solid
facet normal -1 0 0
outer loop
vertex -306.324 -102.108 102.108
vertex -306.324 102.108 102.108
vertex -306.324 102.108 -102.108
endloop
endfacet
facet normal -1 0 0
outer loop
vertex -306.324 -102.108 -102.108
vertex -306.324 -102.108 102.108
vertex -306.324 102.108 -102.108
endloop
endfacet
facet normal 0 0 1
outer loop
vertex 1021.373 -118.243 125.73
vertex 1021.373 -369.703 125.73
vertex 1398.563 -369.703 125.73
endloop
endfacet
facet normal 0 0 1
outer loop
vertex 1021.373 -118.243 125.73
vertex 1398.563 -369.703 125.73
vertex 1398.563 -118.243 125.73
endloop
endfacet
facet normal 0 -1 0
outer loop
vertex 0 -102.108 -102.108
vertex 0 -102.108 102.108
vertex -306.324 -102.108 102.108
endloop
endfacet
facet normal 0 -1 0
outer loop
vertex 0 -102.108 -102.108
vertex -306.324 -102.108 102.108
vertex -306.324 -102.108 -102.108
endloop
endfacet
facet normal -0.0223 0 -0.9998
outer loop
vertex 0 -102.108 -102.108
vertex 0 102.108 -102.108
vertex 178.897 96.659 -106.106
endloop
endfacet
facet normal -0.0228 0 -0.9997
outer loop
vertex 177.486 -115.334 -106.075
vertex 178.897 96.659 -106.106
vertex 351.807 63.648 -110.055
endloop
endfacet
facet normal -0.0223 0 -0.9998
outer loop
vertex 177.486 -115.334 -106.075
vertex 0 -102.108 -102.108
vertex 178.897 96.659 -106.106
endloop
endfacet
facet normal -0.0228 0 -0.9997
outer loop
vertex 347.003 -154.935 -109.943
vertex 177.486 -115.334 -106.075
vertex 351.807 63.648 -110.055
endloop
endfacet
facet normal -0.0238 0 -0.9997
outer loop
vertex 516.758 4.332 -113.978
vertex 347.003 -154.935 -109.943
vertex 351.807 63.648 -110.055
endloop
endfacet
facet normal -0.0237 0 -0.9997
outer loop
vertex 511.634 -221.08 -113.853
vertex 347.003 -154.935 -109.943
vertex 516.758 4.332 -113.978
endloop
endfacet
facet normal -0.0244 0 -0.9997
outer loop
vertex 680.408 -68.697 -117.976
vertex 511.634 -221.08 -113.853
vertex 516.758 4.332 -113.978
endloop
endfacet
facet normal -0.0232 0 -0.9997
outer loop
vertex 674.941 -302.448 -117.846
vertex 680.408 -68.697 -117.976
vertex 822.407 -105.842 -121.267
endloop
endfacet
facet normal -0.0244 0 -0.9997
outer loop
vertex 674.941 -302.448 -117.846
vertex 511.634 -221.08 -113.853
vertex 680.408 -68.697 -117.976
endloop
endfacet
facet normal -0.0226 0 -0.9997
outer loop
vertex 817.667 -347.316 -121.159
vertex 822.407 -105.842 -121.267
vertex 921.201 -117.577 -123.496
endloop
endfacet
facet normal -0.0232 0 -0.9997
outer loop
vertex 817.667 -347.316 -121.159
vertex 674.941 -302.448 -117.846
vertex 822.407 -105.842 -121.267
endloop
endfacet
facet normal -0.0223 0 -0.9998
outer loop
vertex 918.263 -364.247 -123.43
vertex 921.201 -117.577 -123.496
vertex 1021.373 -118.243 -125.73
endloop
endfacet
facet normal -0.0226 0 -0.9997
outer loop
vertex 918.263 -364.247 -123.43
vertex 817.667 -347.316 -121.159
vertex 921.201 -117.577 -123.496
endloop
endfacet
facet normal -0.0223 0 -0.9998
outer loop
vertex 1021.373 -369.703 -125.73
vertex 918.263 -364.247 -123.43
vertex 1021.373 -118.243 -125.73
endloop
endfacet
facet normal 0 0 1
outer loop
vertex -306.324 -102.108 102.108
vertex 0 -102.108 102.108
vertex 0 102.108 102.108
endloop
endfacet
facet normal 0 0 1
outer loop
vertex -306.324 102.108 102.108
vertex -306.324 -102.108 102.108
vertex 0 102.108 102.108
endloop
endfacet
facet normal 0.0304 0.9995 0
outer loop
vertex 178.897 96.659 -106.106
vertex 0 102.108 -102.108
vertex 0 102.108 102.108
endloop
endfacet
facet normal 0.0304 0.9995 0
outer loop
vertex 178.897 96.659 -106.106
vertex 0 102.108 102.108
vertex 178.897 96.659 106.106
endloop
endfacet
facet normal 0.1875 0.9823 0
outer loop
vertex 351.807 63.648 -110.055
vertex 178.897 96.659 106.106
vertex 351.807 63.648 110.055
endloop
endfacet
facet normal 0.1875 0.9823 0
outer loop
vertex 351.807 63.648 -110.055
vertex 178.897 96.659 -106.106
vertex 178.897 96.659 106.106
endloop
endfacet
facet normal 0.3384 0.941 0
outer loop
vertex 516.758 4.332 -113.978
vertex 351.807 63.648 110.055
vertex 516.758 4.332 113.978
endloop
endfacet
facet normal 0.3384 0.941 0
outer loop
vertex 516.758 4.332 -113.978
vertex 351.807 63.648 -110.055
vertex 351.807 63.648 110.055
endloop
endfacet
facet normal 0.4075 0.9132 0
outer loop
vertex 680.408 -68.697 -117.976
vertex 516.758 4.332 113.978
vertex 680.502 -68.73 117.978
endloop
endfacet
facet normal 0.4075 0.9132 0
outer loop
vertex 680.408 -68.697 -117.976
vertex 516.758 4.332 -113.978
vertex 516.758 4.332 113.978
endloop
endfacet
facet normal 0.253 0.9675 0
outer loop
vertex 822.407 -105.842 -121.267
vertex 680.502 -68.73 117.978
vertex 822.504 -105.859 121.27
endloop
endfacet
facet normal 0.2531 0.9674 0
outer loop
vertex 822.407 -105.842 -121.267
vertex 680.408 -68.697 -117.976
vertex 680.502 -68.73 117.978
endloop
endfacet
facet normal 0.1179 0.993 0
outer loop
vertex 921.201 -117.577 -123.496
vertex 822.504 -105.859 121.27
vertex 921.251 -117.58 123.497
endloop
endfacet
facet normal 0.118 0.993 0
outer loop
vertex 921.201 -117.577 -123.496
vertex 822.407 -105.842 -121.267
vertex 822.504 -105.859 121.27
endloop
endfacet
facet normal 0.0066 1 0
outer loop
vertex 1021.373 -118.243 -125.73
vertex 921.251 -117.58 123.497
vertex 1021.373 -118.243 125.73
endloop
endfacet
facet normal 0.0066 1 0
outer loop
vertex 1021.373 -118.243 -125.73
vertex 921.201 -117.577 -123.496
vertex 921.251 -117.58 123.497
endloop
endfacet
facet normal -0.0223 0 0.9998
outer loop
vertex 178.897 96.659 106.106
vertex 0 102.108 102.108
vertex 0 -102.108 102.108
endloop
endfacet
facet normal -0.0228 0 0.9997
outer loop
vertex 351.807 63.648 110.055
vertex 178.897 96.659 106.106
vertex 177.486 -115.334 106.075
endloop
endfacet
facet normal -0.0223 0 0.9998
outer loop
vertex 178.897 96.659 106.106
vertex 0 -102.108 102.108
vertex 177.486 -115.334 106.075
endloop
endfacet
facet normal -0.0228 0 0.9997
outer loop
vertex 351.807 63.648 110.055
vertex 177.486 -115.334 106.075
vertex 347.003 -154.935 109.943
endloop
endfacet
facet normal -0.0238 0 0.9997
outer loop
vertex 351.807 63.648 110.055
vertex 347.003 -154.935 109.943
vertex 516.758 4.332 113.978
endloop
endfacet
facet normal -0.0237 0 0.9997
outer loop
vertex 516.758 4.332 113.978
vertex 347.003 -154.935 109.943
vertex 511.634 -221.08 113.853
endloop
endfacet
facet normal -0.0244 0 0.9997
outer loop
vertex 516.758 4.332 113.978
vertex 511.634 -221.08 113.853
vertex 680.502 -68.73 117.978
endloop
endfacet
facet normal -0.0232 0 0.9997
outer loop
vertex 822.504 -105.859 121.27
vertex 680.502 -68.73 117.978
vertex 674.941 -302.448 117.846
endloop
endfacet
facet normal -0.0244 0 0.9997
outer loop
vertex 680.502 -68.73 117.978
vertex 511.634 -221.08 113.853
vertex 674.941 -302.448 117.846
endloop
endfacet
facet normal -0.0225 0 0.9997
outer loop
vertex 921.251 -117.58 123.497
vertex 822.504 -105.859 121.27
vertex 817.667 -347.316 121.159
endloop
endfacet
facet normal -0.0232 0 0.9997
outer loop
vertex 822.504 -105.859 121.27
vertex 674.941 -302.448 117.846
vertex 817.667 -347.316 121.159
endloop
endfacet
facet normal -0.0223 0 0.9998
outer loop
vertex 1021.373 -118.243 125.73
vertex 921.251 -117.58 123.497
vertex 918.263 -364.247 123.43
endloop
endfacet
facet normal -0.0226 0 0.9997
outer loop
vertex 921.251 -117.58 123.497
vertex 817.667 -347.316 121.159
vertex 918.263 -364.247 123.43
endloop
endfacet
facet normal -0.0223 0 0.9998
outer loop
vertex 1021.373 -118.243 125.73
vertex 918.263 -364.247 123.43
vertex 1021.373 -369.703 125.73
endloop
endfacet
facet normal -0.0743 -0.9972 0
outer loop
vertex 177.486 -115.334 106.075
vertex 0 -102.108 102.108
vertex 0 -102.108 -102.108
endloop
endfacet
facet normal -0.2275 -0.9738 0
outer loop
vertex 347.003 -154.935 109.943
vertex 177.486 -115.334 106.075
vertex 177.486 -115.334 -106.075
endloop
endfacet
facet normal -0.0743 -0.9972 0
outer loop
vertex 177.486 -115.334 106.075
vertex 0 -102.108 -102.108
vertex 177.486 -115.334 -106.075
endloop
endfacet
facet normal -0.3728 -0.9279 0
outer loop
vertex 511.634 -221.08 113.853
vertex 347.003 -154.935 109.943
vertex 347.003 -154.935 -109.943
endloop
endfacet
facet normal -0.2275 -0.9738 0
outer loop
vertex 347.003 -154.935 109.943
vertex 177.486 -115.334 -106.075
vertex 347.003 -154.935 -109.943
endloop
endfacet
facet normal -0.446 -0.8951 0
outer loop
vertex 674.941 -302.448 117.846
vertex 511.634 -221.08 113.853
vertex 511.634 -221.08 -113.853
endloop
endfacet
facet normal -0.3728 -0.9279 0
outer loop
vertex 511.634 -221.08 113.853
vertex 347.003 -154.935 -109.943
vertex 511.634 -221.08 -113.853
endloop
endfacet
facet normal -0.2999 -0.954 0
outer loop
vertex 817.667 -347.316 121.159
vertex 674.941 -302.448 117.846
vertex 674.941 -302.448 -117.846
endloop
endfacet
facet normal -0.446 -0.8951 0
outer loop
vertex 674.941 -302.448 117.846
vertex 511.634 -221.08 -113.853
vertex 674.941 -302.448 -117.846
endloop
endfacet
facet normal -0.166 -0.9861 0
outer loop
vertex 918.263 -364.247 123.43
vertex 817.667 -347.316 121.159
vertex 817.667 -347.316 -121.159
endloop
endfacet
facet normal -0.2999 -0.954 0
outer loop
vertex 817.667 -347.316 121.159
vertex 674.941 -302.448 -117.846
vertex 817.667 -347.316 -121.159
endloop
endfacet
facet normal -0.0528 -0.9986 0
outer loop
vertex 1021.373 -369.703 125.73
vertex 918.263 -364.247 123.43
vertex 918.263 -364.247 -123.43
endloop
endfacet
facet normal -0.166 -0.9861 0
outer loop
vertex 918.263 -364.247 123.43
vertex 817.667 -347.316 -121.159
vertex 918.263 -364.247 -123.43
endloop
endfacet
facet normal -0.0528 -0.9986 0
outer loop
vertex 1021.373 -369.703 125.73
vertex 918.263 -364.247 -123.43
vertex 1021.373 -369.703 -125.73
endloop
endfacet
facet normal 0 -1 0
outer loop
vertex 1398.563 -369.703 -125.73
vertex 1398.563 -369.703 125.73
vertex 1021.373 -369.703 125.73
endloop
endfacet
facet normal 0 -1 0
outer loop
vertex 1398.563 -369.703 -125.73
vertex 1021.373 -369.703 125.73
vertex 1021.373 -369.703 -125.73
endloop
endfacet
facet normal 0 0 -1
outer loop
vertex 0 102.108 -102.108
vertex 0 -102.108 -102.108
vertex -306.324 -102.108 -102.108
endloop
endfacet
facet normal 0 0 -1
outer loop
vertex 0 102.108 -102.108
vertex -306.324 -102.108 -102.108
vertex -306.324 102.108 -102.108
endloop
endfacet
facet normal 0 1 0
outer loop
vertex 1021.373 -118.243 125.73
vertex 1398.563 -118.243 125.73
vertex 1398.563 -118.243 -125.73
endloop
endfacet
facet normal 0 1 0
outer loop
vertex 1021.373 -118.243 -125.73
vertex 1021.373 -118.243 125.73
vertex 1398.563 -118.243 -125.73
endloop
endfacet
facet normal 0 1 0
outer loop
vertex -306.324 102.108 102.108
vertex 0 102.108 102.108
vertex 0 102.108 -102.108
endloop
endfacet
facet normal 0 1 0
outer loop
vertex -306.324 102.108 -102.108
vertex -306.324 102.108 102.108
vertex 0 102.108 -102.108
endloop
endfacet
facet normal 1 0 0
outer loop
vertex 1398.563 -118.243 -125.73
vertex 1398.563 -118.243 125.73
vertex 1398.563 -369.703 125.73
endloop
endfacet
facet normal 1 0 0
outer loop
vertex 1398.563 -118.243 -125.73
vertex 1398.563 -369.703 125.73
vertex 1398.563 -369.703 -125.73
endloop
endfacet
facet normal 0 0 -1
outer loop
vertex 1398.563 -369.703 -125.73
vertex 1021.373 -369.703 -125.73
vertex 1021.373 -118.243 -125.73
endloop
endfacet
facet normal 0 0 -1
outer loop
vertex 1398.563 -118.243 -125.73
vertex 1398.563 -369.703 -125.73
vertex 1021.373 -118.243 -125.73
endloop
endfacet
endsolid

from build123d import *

# Parameters (mm, degrees)
LOFT1_START         = -125.7300001
LOFT1_DEPTH         = 251.4600001
LOFT1_START_2       = -371
LOFT1_2_DEPTH       = 475
SKETCH6_W           = 204.216
SKETCH6_H           = 204.216
BOSS_EXTRUDE1_DEPTH = 306.324
SKETCH8_W           = 251.46
SKETCH8_H           = 251.46
BOSS_EXTRUDE2_DEPTH = 377.19


with BuildPart() as part:
    # Loft1: read off the stored shape, not the designer's step
    # Loft1 outline → Loft1 (new body)
    with BuildSketch(Plane.XY.offset(LOFT1_START)):
        with BuildLine():
            Line((1021.373155762, -369.703305112), (1021.373155762, -118.243305112))
            add(Edge.make_bspline(
                [(0, 102.108), (196.914895518, 111.82689324), (392.936444227, 69.537154328), (708.143629326, -92.279435597), (864.402326567, -125.990726792), (1021.373155762, -118.243305112)],
                knots=[0, 0, 0, 0, 0.556436391, 0.556436391, 1, 1, 1, 1], degree=3))
            Line((0, 102.108), (0, -102.108))
            add(Edge.make_bspline(
                [(0, -102.108), (196.914895518, -101.151867047), (392.936444227, -152.204366245), (708.143629326, -329.768956171), (864.402326567, -370.465487079), (1021.373155762, -369.703305112)],
                knots=[0, 0, 0, 0, 0.556436391, 0.556436391, 1, 1, 1, 1], degree=3))
        make_face()
    extrude(amount=LOFT1_DEPTH)

    # Loft1 2 outline → Loft1 2 (cut)
    with BuildSketch(Plane(origin=(0, 0, 0), x_dir=(1, 0, 0), z_dir=(0, 1, 0)).offset(LOFT1_START_2)):
        with BuildLine():
            Line((0, 125.7300001), (0, 102.108))
            add(Edge.make_bspline(
                [(0, 102.108), (196.914895518, 106.489380143), (392.936444227, 110.870760287), (708.143629326, 118.744760287), (864.402326567, 122.237380143), (1021.373155762, 125.73)],
                knots=[0, 0, 0, 0, 0.556436391, 0.556436391, 1, 1, 1, 1], degree=3))
            Line((1021.373155762, 125.73), (0, 125.7300001))
        make_face()
        with BuildLine():
            add(Edge.make_bspline(
                [(0, -102.108), (196.914895518, -106.489380143), (392.936444227, -110.870760287), (708.143629326, -118.744760287), (864.402326567, -122.237380143), (1021.373155762, -125.73)],
                knots=[0, 0, 0, 0, 0.556436391, 0.556436391, 1, 1, 1, 1], degree=3))
            Line((0, -102.108), (0, -125.73))
            Line((0, -125.73), (1021.373155762, -125.73))
        make_face()
    extrude(amount=LOFT1_2_DEPTH, mode=Mode.SUBTRACT)

    # Sketch6 → Boss-Extrude1 (add)
    with BuildSketch(Plane(origin=(0, 0, 0), x_dir=(0, 0, -1), z_dir=(1, 0, 0))):
        Rectangle(SKETCH6_W, SKETCH6_H)
    extrude(amount=-BOSS_EXTRUDE1_DEPTH)

    # Sketch8 → Boss-Extrude2 (add)
    with BuildSketch(Plane(origin=(1021.373155762, 0, 0), x_dir=(0, 0, -1), z_dir=(1, 0, 0))):
        with Locations((0, -243.973305112)):
            Rectangle(SKETCH8_W, SKETCH8_H)
    extrude(amount=BOSS_EXTRUDE2_DEPTH)


solid = part.part
